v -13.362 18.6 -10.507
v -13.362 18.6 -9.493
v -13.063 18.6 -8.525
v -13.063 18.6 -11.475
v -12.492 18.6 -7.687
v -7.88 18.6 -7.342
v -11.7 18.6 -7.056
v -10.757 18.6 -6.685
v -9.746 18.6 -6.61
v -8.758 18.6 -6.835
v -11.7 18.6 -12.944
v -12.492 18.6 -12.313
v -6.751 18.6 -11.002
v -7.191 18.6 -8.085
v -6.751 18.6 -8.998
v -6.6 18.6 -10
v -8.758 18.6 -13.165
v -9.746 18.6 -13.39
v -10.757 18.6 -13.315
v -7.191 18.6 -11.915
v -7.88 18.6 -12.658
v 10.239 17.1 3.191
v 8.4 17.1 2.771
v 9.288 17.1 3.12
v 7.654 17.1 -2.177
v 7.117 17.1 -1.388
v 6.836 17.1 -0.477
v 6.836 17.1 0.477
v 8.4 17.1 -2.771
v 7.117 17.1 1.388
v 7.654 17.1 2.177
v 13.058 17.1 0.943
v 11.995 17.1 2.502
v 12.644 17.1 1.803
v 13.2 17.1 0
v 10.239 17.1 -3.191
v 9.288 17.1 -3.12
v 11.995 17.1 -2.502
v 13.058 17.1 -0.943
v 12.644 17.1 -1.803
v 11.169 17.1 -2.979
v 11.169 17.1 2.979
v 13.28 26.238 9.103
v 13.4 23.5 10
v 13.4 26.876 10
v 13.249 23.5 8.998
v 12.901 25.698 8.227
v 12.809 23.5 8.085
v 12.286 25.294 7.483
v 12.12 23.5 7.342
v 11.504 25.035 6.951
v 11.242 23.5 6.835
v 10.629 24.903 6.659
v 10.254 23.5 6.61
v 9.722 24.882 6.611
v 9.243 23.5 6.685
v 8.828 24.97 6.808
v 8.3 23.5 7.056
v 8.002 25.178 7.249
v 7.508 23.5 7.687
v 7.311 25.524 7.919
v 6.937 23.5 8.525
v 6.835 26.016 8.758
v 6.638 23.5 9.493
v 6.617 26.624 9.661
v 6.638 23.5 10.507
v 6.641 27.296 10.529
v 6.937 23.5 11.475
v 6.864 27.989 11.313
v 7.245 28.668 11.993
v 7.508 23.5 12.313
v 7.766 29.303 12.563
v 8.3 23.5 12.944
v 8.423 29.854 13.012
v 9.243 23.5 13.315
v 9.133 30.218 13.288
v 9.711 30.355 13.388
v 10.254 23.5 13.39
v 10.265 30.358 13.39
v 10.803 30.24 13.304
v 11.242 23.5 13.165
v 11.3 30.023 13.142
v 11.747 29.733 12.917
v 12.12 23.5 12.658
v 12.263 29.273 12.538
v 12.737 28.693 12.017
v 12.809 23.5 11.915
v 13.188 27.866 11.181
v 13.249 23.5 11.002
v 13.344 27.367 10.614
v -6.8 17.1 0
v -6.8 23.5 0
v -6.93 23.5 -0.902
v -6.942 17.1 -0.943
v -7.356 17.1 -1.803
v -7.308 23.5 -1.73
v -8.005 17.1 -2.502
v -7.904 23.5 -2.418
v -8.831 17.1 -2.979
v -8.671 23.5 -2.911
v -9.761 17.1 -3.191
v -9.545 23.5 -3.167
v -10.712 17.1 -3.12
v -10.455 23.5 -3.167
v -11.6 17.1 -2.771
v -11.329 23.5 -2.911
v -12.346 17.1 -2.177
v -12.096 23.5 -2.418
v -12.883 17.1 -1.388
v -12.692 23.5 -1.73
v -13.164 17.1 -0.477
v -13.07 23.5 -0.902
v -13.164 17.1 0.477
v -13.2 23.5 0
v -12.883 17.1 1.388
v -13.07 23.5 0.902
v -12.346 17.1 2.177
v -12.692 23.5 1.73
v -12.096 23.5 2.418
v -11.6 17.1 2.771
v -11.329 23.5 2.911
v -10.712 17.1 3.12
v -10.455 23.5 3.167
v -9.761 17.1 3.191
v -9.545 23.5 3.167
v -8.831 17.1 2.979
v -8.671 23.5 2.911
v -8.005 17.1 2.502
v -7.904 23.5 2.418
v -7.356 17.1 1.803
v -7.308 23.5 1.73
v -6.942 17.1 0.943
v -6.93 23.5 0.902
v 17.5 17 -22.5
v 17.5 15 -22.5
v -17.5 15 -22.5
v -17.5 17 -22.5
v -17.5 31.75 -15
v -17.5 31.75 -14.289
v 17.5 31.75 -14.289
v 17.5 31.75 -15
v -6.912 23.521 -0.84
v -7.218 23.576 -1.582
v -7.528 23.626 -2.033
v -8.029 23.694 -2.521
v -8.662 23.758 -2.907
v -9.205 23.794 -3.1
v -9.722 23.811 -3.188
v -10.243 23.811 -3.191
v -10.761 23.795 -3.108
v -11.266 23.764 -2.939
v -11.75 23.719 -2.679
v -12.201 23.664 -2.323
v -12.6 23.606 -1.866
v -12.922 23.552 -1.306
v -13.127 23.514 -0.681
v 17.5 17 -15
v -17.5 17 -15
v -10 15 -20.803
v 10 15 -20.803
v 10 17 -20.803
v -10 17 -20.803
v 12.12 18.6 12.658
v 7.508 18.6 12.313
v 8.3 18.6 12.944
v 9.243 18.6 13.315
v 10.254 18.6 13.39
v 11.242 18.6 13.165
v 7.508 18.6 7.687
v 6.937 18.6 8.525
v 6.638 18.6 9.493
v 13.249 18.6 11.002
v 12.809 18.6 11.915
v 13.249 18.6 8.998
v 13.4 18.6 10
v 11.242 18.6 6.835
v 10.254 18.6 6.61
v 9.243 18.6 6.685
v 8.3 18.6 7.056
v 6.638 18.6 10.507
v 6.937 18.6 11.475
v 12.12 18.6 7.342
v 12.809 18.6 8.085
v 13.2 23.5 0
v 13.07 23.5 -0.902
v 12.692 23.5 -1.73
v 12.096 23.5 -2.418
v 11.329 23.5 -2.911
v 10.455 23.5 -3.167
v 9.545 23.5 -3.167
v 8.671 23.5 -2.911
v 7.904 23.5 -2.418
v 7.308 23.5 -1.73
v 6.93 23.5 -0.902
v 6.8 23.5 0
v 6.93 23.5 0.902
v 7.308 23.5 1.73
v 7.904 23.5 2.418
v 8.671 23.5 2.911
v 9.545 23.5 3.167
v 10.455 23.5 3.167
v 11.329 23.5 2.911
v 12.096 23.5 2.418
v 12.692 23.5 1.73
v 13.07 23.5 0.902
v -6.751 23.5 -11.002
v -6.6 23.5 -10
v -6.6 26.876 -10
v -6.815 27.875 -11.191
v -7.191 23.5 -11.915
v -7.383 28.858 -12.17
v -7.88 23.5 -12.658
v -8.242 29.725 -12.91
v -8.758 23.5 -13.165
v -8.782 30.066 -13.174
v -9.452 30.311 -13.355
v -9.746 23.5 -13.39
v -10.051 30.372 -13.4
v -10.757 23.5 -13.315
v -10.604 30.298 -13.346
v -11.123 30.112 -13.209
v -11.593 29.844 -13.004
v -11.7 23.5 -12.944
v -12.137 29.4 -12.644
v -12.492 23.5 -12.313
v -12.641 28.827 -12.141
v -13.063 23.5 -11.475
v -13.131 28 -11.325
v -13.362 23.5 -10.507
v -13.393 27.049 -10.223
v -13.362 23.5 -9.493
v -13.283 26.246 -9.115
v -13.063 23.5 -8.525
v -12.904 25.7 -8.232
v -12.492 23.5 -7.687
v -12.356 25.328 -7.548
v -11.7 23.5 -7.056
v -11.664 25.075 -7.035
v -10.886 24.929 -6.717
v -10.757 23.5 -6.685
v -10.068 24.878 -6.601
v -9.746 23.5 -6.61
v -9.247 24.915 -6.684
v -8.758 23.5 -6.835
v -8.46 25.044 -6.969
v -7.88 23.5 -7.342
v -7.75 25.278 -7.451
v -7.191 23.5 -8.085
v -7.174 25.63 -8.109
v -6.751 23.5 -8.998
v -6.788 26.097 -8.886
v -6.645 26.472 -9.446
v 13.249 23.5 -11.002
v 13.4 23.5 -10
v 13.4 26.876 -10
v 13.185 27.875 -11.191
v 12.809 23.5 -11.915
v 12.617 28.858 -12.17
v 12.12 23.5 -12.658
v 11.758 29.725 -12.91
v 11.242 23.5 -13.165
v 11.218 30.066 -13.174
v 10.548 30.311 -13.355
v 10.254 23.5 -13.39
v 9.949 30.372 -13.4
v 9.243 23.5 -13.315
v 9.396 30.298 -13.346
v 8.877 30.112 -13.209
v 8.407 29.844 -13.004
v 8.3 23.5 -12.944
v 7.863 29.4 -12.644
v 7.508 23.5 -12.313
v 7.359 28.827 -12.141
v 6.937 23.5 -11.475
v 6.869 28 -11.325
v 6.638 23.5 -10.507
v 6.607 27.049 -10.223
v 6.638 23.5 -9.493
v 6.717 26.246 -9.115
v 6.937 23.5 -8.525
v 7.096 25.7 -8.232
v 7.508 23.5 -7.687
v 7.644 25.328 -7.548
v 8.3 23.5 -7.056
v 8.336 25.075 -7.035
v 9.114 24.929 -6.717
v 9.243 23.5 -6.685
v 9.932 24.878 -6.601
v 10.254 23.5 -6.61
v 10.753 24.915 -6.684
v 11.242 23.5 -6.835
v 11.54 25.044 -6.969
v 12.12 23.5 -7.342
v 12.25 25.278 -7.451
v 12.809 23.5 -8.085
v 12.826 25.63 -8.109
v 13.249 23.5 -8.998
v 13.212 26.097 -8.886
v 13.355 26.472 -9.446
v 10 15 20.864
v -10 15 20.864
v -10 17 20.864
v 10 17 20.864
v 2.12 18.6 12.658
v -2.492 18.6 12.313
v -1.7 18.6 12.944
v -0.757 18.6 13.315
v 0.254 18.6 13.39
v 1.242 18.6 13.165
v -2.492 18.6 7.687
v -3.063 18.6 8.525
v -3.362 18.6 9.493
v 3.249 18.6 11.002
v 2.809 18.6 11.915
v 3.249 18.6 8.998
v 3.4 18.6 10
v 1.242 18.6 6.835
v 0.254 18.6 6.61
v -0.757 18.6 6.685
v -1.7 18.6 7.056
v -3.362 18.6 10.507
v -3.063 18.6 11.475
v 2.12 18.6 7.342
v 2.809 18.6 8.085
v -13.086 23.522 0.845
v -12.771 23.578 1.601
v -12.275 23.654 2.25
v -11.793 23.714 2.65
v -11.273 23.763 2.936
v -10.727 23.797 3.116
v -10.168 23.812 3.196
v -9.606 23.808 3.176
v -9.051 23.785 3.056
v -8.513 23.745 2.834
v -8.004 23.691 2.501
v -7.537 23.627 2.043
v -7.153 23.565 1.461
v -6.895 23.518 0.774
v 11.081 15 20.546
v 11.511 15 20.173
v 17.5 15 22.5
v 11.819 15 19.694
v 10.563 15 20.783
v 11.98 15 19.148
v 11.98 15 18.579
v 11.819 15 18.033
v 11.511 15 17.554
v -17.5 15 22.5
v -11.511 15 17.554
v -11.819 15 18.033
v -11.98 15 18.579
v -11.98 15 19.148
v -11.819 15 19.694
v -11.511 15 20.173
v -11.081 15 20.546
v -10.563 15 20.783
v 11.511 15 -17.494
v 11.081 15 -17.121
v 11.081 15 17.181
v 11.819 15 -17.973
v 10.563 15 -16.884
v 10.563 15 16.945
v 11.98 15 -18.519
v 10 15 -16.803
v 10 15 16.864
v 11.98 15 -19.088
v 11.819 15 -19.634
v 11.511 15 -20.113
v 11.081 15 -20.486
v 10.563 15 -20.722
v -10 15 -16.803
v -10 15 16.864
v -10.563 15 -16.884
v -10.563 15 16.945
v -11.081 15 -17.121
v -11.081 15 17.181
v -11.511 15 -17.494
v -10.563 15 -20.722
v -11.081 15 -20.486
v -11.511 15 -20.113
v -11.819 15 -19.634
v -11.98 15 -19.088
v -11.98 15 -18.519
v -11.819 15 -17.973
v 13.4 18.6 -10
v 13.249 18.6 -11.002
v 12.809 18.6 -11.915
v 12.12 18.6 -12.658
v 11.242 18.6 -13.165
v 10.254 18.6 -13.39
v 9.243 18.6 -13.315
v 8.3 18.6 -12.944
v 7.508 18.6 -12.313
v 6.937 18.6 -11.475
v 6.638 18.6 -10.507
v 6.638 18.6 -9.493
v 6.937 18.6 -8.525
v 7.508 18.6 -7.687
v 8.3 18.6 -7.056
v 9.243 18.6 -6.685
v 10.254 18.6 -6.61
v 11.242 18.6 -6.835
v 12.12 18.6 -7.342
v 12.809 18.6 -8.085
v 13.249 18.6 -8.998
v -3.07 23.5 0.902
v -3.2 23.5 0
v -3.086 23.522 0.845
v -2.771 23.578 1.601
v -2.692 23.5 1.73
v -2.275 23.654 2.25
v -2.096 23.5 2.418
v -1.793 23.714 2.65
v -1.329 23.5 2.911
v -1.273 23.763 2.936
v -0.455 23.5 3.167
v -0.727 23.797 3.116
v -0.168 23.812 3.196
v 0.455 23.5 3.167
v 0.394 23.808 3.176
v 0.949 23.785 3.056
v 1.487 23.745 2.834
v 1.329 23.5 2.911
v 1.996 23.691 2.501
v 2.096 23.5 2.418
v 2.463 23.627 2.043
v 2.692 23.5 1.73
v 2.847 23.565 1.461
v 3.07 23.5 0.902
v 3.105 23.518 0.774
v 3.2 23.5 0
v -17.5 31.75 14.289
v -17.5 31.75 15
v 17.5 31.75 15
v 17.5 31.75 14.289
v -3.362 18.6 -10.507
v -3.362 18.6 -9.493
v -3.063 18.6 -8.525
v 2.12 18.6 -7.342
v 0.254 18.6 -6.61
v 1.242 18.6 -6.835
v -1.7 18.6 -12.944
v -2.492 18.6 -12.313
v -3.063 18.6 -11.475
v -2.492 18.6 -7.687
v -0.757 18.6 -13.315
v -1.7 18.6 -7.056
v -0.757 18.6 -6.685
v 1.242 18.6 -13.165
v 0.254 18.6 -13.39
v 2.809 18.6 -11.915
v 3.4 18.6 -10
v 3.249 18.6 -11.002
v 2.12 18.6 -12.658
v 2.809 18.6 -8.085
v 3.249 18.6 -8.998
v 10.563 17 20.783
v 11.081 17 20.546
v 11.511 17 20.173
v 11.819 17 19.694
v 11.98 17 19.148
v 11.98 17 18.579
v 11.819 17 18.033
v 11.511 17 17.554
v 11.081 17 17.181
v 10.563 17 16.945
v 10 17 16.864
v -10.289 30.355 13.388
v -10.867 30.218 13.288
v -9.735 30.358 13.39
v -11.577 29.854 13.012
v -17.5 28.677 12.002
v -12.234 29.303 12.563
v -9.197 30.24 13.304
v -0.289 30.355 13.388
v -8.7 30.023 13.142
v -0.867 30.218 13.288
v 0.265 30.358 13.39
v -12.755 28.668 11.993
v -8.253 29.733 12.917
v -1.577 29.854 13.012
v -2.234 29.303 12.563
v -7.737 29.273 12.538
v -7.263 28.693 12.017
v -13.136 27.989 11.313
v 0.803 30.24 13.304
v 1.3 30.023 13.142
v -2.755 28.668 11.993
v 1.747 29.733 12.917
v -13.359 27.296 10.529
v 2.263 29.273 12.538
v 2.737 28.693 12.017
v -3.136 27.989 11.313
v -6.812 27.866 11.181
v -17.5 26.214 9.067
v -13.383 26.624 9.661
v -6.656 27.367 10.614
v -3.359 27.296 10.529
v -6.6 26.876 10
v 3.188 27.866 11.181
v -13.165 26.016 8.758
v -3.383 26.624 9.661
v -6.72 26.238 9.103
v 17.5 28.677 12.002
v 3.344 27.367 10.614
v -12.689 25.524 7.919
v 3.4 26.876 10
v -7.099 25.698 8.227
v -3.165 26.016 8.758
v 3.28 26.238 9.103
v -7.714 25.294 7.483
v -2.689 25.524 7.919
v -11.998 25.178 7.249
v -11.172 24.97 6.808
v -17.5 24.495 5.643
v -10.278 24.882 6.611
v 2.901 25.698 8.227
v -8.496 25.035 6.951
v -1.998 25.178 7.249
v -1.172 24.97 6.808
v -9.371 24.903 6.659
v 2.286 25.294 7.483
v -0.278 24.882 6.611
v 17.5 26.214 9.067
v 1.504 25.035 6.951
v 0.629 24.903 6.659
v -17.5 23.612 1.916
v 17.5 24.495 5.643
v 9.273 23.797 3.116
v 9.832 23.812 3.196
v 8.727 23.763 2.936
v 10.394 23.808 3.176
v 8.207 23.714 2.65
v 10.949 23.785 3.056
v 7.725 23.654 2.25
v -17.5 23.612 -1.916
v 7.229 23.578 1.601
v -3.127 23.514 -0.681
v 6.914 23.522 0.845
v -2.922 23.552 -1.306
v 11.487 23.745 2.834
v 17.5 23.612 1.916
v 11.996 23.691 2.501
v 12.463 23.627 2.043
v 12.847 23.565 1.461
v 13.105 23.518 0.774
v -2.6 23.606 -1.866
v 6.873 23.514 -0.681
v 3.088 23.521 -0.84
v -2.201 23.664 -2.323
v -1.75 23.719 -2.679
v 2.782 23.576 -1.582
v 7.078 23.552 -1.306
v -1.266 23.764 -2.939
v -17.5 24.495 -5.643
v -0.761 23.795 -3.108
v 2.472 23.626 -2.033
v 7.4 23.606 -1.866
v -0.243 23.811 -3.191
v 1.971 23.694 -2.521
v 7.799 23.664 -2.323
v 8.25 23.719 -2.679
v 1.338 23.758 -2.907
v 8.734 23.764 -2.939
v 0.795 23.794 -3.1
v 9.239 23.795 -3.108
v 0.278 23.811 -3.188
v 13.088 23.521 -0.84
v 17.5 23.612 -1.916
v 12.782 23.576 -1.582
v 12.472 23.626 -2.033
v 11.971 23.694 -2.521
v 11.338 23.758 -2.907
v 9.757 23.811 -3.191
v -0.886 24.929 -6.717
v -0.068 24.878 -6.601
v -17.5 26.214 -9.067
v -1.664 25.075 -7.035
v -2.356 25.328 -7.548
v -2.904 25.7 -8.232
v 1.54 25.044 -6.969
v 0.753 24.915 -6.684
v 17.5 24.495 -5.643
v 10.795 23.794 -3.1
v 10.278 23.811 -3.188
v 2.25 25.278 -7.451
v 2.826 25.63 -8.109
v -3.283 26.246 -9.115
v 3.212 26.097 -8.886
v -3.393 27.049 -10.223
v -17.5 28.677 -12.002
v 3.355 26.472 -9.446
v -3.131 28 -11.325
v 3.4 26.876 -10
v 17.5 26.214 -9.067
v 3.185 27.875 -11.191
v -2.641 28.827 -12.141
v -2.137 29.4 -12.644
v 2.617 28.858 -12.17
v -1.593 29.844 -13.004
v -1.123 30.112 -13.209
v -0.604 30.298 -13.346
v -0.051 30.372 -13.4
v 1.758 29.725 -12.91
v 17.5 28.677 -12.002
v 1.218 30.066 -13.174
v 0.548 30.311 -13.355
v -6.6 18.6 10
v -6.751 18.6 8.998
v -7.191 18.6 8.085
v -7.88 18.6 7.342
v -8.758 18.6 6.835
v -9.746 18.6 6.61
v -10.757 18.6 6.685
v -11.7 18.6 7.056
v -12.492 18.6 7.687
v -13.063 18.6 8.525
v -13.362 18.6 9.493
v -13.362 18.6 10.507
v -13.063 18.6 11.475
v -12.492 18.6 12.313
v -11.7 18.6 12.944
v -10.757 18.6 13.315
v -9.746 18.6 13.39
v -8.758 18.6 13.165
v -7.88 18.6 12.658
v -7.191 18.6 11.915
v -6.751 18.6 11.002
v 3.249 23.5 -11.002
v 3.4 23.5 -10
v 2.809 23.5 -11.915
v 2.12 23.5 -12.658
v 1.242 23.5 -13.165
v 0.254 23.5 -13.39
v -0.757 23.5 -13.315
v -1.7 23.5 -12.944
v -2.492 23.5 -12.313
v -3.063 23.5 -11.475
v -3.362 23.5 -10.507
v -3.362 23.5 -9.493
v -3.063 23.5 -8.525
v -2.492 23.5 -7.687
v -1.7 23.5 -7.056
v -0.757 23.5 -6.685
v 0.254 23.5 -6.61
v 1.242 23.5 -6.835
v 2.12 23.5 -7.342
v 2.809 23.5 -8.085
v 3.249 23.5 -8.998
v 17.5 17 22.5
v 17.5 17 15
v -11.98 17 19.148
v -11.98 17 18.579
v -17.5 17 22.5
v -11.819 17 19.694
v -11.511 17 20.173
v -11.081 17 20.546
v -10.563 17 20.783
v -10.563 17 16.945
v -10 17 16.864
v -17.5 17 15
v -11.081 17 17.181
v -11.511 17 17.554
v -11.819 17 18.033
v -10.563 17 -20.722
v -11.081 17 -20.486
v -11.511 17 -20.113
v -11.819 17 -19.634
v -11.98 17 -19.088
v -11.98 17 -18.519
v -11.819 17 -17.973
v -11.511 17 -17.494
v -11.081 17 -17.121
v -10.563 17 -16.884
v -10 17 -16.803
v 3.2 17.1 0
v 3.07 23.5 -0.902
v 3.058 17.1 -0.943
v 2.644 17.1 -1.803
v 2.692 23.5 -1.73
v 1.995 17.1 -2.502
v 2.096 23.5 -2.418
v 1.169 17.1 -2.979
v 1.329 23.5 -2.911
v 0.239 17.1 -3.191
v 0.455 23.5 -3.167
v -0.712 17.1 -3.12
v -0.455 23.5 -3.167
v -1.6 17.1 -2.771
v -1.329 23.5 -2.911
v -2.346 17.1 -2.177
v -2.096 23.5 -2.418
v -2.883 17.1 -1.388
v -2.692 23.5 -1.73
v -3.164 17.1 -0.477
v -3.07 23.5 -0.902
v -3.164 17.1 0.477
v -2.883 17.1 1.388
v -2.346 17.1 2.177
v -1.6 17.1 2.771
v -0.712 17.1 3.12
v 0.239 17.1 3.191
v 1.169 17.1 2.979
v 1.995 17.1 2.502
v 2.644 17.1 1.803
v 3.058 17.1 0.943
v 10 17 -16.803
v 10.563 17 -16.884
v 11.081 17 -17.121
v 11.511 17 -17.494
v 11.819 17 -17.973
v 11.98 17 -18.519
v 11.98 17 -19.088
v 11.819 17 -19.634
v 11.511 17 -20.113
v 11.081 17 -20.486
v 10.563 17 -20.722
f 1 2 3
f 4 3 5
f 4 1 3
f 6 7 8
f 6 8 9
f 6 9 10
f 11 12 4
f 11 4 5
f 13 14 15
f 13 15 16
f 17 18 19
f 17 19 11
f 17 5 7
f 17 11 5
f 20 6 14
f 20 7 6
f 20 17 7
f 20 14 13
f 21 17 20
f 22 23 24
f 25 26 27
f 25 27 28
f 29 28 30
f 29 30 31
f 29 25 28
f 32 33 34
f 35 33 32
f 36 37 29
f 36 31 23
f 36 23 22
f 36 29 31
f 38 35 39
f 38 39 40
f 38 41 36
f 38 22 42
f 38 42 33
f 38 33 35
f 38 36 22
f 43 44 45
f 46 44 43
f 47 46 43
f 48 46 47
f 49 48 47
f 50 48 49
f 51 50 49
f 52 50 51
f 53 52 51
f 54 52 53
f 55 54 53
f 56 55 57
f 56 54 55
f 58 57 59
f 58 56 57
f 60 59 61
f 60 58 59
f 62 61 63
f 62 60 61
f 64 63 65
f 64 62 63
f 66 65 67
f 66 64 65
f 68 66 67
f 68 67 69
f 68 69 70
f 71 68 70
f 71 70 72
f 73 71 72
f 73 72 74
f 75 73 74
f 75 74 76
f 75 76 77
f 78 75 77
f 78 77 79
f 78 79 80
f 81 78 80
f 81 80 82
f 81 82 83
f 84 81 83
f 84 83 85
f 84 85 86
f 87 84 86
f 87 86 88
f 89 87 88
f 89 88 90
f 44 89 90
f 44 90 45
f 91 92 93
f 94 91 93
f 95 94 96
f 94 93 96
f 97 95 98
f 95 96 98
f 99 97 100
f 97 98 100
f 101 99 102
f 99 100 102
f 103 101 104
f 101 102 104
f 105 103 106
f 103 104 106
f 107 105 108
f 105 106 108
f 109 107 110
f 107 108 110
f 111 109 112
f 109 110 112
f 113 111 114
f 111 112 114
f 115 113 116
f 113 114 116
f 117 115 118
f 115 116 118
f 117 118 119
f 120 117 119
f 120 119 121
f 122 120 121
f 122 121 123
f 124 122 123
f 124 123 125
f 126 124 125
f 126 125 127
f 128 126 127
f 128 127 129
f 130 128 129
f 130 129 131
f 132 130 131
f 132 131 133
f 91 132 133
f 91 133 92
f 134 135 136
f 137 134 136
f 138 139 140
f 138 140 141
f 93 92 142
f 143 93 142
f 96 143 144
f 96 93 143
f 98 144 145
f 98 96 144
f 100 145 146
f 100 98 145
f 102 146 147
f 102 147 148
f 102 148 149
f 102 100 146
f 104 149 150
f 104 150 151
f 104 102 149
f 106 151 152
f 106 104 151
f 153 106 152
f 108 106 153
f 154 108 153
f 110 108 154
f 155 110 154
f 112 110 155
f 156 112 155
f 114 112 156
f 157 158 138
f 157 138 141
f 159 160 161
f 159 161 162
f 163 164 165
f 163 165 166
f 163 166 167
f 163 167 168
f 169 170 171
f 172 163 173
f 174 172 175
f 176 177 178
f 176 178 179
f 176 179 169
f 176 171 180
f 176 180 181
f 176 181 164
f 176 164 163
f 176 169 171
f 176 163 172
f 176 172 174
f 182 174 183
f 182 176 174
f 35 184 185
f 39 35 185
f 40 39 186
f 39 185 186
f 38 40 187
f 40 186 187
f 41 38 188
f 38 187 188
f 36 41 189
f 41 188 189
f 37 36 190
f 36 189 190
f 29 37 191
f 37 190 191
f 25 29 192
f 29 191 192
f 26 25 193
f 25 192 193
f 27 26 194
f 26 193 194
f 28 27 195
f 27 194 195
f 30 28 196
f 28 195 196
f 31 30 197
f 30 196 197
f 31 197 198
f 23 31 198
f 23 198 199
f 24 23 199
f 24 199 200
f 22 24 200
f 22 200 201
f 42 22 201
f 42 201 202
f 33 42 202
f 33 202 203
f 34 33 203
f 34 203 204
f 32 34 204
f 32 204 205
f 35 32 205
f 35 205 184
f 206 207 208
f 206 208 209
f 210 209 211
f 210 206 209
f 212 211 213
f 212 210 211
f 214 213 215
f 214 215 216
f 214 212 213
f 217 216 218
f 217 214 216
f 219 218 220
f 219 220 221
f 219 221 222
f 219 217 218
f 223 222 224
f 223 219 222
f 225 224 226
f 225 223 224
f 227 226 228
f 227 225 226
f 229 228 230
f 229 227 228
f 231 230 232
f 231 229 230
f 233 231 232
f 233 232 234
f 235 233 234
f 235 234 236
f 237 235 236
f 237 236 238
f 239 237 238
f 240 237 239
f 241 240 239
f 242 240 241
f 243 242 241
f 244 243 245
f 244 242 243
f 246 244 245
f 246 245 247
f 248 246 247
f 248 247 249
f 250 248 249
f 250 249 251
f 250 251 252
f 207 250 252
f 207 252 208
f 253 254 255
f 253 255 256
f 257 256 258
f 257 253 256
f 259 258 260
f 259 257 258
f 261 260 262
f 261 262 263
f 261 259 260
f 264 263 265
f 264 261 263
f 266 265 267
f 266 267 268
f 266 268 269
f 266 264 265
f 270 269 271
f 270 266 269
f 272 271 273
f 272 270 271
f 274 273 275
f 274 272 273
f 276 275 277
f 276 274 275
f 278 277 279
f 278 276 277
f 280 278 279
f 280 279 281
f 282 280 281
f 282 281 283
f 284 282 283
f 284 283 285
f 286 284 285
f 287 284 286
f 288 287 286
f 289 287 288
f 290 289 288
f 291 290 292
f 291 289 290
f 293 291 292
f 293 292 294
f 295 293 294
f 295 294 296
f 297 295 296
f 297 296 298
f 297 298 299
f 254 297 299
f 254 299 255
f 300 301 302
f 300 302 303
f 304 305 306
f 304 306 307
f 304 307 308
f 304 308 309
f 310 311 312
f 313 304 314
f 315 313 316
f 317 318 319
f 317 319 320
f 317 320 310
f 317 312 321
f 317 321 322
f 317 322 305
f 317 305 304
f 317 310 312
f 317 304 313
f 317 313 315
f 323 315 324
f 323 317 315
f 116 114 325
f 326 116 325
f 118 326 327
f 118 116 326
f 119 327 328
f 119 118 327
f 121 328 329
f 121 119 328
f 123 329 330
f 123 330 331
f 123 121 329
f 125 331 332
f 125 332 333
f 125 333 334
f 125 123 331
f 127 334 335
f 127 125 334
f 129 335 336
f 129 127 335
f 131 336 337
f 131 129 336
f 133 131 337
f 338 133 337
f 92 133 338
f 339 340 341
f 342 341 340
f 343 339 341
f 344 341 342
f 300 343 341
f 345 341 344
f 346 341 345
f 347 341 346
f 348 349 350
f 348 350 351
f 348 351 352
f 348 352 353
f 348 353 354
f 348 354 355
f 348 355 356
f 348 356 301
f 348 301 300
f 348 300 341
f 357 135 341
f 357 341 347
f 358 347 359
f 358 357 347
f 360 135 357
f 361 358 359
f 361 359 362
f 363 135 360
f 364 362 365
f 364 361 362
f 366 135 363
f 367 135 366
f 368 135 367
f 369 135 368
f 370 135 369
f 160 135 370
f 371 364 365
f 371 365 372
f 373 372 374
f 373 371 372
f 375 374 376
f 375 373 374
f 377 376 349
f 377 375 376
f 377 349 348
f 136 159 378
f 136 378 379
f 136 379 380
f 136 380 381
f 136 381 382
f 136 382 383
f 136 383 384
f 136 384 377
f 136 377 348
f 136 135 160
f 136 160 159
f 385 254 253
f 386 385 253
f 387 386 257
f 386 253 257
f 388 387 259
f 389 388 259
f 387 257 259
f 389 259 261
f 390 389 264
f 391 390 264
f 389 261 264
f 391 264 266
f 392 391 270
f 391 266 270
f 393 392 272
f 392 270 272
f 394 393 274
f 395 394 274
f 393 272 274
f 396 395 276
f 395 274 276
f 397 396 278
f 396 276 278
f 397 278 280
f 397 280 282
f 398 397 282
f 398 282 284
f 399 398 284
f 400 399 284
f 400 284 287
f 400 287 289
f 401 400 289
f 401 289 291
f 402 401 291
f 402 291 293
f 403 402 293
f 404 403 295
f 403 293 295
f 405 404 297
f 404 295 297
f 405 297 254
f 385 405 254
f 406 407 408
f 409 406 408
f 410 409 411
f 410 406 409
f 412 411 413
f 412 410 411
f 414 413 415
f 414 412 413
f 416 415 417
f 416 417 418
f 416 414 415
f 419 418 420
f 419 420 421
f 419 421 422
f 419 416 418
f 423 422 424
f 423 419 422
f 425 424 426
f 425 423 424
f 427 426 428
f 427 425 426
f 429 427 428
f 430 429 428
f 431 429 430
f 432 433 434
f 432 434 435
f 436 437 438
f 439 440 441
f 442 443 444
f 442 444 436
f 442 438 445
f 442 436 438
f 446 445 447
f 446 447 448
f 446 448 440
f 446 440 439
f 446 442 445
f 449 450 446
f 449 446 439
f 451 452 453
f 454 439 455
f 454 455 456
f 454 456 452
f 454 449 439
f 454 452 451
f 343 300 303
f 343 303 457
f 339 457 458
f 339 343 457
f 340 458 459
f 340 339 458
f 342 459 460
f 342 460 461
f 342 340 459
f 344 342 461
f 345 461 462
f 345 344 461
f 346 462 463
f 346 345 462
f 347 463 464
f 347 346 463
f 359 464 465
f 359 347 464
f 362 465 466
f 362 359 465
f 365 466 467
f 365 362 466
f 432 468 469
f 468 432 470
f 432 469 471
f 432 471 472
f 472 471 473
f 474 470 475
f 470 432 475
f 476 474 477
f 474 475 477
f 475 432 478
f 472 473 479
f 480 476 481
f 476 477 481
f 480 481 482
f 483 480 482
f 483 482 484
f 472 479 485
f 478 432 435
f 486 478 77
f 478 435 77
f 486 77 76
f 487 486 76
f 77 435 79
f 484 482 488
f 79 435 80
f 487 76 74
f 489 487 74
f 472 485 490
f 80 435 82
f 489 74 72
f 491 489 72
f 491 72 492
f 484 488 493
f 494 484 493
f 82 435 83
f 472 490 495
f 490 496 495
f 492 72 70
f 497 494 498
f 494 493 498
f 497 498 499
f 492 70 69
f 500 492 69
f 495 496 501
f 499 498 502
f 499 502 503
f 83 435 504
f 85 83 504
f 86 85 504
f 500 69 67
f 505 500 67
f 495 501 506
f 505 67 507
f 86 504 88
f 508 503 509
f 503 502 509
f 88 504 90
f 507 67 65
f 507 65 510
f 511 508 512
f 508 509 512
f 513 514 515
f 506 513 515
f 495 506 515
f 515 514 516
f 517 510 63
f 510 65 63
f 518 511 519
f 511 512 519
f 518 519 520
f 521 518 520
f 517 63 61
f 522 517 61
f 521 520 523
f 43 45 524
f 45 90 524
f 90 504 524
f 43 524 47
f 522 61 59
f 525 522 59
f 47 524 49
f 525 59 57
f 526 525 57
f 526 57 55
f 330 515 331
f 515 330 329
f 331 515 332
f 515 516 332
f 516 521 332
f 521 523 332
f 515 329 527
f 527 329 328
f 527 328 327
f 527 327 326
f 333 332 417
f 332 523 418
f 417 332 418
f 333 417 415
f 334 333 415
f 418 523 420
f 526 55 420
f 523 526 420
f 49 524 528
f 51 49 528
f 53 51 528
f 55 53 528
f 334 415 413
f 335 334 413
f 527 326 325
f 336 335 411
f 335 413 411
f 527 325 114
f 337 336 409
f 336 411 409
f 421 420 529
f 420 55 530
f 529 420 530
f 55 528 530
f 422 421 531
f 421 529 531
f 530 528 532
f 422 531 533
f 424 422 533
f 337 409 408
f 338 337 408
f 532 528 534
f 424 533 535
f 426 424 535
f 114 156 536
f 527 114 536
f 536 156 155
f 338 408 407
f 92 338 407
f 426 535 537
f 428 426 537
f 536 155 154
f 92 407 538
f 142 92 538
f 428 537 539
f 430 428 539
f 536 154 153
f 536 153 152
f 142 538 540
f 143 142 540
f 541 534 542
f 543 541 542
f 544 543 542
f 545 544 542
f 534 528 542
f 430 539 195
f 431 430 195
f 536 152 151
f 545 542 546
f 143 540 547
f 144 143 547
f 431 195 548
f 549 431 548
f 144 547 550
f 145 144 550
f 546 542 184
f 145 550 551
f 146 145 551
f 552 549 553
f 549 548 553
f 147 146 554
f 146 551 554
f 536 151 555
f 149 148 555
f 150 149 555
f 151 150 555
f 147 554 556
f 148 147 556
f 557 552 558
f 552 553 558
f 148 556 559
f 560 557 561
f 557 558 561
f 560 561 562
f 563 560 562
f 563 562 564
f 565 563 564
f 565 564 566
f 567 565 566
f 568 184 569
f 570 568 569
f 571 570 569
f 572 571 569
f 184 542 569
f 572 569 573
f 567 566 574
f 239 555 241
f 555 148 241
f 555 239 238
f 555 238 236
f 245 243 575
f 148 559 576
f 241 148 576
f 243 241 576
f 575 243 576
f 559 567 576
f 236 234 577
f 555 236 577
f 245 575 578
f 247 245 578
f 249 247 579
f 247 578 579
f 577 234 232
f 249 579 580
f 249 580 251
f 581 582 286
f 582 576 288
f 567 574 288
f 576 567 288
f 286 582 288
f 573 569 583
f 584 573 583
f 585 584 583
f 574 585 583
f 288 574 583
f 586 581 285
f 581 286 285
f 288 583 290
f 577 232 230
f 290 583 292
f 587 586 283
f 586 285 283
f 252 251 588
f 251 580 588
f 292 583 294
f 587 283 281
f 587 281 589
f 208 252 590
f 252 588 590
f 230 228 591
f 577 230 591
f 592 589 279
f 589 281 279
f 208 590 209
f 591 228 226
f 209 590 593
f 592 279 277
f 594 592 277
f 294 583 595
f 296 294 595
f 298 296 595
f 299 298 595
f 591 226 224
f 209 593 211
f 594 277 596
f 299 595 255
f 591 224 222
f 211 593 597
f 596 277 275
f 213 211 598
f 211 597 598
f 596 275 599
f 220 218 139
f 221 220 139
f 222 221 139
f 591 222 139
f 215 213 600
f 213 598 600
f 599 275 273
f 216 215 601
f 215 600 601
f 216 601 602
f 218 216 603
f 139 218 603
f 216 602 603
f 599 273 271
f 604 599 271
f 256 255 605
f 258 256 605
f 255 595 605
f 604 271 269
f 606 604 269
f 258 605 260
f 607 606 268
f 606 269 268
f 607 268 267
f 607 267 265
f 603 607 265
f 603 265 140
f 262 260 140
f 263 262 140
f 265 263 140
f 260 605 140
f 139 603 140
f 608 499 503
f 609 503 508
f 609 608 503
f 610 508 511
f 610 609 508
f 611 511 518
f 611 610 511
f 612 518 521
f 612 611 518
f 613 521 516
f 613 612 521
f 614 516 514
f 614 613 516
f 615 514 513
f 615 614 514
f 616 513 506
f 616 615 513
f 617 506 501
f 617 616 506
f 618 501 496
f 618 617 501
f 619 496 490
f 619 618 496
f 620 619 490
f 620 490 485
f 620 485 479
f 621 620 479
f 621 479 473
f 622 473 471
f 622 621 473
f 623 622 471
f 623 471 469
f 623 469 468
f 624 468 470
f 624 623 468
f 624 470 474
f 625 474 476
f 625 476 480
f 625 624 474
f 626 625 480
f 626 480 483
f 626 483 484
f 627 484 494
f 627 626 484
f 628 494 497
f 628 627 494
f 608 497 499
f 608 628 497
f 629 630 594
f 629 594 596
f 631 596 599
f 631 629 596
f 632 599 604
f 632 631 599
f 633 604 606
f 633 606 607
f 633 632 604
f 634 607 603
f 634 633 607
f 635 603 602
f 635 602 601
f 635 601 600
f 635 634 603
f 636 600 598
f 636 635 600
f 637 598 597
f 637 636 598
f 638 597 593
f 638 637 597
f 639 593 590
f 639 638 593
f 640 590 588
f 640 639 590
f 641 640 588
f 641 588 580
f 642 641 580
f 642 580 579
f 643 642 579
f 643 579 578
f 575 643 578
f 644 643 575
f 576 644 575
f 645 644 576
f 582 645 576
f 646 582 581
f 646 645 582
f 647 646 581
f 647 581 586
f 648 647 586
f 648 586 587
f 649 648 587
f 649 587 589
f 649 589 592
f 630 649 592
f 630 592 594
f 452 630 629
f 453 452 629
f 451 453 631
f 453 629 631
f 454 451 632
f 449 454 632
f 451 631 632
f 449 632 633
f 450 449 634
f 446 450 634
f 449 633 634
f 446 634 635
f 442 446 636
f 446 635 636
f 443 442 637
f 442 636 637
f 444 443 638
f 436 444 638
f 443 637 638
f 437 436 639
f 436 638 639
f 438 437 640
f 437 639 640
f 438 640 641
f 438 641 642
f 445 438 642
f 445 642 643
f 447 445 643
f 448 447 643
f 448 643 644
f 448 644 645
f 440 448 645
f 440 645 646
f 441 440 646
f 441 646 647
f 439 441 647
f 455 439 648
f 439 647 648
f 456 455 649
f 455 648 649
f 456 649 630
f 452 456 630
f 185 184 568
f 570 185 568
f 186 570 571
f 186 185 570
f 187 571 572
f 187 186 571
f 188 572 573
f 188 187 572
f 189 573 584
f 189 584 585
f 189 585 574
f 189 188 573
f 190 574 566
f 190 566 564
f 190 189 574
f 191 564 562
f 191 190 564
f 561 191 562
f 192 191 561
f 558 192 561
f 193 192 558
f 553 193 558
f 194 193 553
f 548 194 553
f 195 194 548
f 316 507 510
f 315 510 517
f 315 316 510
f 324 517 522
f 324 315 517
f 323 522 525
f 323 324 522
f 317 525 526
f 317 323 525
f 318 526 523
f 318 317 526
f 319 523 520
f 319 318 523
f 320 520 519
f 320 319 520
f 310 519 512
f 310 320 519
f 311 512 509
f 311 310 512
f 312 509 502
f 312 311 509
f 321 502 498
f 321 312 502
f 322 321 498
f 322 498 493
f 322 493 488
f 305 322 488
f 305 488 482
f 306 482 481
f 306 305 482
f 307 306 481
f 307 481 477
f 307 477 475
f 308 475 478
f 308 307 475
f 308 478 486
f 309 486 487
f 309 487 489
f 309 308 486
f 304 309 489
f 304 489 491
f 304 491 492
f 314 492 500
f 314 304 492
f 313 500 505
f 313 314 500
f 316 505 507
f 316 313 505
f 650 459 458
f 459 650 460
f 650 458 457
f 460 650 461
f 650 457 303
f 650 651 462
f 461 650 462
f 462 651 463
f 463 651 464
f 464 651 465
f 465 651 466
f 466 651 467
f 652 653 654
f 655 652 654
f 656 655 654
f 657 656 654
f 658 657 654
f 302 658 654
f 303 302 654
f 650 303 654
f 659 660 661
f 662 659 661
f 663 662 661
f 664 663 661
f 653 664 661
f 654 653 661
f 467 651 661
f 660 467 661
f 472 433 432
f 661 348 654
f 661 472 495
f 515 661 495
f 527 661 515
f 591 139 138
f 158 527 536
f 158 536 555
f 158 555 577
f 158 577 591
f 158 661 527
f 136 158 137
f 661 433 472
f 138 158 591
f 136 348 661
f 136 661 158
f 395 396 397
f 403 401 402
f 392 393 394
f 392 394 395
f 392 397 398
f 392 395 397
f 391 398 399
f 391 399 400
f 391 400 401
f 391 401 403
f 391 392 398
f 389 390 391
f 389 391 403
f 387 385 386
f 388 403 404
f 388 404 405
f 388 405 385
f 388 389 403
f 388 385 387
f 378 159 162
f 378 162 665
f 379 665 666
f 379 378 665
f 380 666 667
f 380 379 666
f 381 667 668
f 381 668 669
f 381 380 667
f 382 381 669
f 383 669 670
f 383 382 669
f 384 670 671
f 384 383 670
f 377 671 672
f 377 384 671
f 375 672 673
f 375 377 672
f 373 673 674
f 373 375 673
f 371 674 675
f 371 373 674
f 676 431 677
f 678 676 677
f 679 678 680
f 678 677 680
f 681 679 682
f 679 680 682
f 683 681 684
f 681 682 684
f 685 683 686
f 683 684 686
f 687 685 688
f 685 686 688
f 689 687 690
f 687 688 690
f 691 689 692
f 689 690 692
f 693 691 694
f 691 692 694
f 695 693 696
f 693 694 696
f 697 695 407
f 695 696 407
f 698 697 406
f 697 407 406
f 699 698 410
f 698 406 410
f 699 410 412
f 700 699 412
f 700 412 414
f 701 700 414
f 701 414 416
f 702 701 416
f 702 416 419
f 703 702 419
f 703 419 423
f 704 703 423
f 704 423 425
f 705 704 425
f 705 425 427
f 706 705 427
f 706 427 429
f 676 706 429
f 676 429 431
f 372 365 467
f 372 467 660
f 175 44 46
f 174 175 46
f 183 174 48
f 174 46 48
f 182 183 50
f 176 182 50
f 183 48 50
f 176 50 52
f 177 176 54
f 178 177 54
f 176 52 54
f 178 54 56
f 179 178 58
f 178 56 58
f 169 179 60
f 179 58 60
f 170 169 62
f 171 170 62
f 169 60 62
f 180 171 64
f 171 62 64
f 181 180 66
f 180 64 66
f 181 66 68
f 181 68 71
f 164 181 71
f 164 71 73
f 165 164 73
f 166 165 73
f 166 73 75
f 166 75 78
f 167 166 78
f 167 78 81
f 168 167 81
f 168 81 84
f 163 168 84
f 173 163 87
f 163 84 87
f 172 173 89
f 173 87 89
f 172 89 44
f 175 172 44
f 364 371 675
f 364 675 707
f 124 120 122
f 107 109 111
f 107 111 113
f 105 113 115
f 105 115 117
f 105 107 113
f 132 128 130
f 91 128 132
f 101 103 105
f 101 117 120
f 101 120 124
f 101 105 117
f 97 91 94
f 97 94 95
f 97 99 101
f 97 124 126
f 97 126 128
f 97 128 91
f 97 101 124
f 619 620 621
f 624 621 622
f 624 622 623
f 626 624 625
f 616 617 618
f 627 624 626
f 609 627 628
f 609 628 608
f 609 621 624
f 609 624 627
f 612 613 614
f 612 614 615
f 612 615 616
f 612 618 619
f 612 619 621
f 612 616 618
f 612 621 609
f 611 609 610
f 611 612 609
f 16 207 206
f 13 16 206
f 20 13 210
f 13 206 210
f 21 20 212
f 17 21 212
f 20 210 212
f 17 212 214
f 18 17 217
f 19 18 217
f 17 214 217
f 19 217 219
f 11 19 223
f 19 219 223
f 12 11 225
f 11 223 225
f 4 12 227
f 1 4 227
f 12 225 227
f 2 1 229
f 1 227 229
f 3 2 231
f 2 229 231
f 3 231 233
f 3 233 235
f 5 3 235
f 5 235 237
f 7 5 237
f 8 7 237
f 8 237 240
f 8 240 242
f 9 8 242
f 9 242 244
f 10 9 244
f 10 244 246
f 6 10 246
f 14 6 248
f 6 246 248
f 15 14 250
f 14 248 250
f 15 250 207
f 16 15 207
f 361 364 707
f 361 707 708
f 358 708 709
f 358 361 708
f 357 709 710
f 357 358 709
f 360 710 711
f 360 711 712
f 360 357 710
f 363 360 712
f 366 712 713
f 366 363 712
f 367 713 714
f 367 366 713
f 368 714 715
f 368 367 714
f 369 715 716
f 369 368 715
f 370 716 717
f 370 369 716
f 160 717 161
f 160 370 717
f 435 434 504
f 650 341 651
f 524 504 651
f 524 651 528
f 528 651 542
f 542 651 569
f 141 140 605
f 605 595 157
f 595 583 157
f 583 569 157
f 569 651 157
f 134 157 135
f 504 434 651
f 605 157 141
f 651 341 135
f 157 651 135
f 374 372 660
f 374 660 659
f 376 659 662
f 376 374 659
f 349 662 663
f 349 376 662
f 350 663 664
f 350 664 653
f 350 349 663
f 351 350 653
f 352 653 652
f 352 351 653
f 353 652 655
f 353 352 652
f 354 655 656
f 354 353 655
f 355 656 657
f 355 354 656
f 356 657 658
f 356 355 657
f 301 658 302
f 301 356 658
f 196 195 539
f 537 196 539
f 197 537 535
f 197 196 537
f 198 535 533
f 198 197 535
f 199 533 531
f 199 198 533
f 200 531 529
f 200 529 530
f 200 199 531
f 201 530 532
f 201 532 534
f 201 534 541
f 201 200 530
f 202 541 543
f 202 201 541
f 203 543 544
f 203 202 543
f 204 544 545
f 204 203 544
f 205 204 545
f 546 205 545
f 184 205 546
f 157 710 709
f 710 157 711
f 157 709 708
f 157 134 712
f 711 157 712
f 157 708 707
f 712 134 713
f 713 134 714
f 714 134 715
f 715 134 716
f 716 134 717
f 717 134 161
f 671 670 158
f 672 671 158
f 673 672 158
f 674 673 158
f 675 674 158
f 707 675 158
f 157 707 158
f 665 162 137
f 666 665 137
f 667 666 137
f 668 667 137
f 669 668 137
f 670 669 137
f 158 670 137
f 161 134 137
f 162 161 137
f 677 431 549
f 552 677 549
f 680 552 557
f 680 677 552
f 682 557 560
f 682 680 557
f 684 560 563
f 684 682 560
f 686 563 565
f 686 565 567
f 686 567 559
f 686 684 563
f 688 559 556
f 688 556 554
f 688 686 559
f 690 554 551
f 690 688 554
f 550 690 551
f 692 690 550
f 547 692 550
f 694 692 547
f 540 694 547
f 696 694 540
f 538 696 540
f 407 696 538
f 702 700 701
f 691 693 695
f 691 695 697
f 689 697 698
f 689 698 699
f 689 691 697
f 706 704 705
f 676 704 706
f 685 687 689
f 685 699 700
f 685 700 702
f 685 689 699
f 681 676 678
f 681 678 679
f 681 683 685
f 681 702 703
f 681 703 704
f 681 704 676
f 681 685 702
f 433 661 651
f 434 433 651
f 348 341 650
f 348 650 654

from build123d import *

# Parameters (mm, degrees)
SKETCH8_W                       = 35
SKETCH8_H                       = 30
BOSS_EXTRUDE7_DEPTH             = 80
SKETCH10_R                      = 16.5
CUT_EXTRUDE3_DEPTH              = 18.5
CUT_EXTRUDE3_DEPTH_BACK         = 18.5
SKETCH11_W                      = 38.336381606
SKETCH11_H                      = 16.50007926
CUT_EXTRUDE4_DEPTH              = 18.5
CUT_EXTRUDE4_DEPTH_BACK         = 18.5
SKETCH12_W                      = 33.824881692
SKETCH12_H                      = 15
CUT_EXTRUDE5_DEPTH              = 18.5
CUT_EXTRUDE5_DEPTH_BACK         = 18.5
SKETCH13_W                      = 45.541829225
SKETCH13_H                      = 41.48776408
CUT_EXTRUDE6_DEPTH              = 18.5
CUT_EXTRUDE6_DEPTH_BACK         = 18.5
SKETCH15_W                      = 35
SKETCH15_H                      = 7.5
BOSS_EXTRUDE9_DEPTH             = 2
CUT_EXTRUDE7_DEPTH              = 2
SKETCH18_R                      = 3.2
CUT_EXTRUDE10_DEPTH             = 9.24996037
CUT_EXTRUDE10_DEPTH_BACK        = 6.4
CUT_EXTRUDE11_REACH             = 10.25
SKETCH19_R                      = 3.4
CUT_EXTRUDE11_DIRECTION_2_DEPTH = 4.9


with BuildPart() as part:
    # Sketch8 → Boss-Extrude7 (new body)
    with BuildSketch(Plane(origin=(0, 0, 0), x_dir=(1, 0, 0), z_dir=(0, 1, 0))):
        Rectangle(SKETCH8_W, SKETCH8_H)
    extrude(amount=BOSS_EXTRUDE7_DEPTH)

    # Sketch10 → Cut-Extrude3 (cut, two sides)
    with BuildSketch(Plane(origin=(0, 0, 0), x_dir=(0, 0, -1), z_dir=(1, 0, 0))) as cut_extrude3_sk:
        with Locations((0, 40)):
            Circle(SKETCH10_R)
    extrude(amount=CUT_EXTRUDE3_DEPTH, mode=Mode.SUBTRACT)
    extrude(cut_extrude3_sk.sketch, amount=-CUT_EXTRUDE3_DEPTH_BACK, mode=Mode.SUBTRACT)

    # Sketch11 → Cut-Extrude4 (cut, two sides)
    with BuildSketch(Plane(origin=(0, 0, 0), x_dir=(0, 0, -1), z_dir=(1, 0, 0))) as cut_extrude4_sk:
        with Locations((0, 40)):
            Rectangle(SKETCH11_W, SKETCH11_H)
    extrude(amount=CUT_EXTRUDE4_DEPTH, mode=Mode.SUBTRACT)
    extrude(cut_extrude4_sk.sketch, amount=-CUT_EXTRUDE4_DEPTH_BACK, mode=Mode.SUBTRACT)

    # Sketch12 → Cut-Extrude5 (cut, two sides)
    with BuildSketch(Plane(origin=(0, 0, 0), x_dir=(0, 0, -1), z_dir=(1, 0, 0))) as cut_extrude5_sk:
        with Locations((0.439040256, 7.5)):
            Rectangle(SKETCH12_W, SKETCH12_H)
    extrude(amount=CUT_EXTRUDE5_DEPTH, mode=Mode.SUBTRACT)
    extrude(cut_extrude5_sk.sketch, amount=-CUT_EXTRUDE5_DEPTH_BACK, mode=Mode.SUBTRACT)

    # Sketch13 → Cut-Extrude6 (cut, two sides)
    with BuildSketch(Plane(origin=(0, 0, 0), x_dir=(0, 0, -1), z_dir=(1, 0, 0))) as cut_extrude6_sk:
        with Locations((-6.569234617, 60.808180877)):
            Rectangle(SKETCH13_W, SKETCH13_H)
    extrude(amount=CUT_EXTRUDE6_DEPTH, mode=Mode.SUBTRACT)
    extrude(cut_extrude6_sk.sketch, amount=-CUT_EXTRUDE6_DEPTH_BACK, mode=Mode.SUBTRACT)

    # Sketch15 → Boss-Extrude9 (add)
    with BuildSketch(Plane(origin=(0, 15, 0), x_dir=(-1, 0, 0), z_dir=(0, -1, 0))):
        with Locations((0, -18.75)):
            Rectangle(SKETCH15_W, SKETCH15_H)
        with Locations((0, 18.75)):
            Rectangle(SKETCH15_W, SKETCH15_H)
    extrude(amount=-BOSS_EXTRUDE9_DEPTH)

    # Sketch16 → Cut-Extrude7 (cut)
    with BuildSketch(Plane(origin=(0, 15, 0), x_dir=(-1, 0, 0), z_dir=(0, -1, 0))):
        with BuildLine():
            Line((10, -20.863517543), (-10, -20.863517543))
            ThreePointArc((-10, -20.863517543), (-12, -18.863517543), (-10, -16.863517543))
            Line((-10, -16.863517543), (10, -16.863517543))
            ThreePointArc((10, -16.863517543), (12, -18.863517543), (10, -20.863517543))
        make_face()
        with BuildLine():
            Line((10, 16.803450623), (-10, 16.803450623))
            ThreePointArc((-10, 16.803450623), (-12, 18.803450623), (-10, 20.803450623))
            Line((-10, 20.803450623), (10, 20.803450623))
            ThreePointArc((10, 20.803450623), (12, 18.803450623), (10, 16.803450623))
        make_face()
    extrude(amount=-CUT_EXTRUDE7_DEPTH, mode=Mode.SUBTRACT)

    # Sketch18 → Cut-Extrude10 (cut, two sides)
    with BuildSketch(Plane(origin=(0, 23.5, 0), x_dir=(1, 0, 0), z_dir=(0, 1, 0))) as cut_extrude10_sk:
        Circle(SKETCH18_R)
        with Locations((10, 0)):
            Circle(SKETCH18_R)
        with Locations((-10, 0)):
            Circle(SKETCH18_R)
    extrude(amount=CUT_EXTRUDE10_DEPTH, mode=Mode.SUBTRACT)
    extrude(cut_extrude10_sk.sketch, amount=-CUT_EXTRUDE10_DEPTH_BACK, mode=Mode.SUBTRACT)

    # Sketch19 → Cut-Extrude11 (cut, up to next)
    with BuildSketch(Plane(origin=(0, 23.5, 0), x_dir=(1, 0, 0), z_dir=(0, 1, 0)), mode=Mode.PRIVATE) as cut_extrude11_sk1:
        with Locations((-10, -10)):
            Circle(SKETCH19_R)
    cut_extrude11_tool1 = extrude(cut_extrude11_sk1.sketch, amount=CUT_EXTRUDE11_REACH, mode=Mode.PRIVATE) & part.part
    add(cut_extrude11_tool1.solids().sort_by_distance((-10, 23.5, 10))[0], mode=Mode.SUBTRACT)
    # Sketch19 → Cut-Extrude11 (cut, up to next)
    with BuildSketch(Plane(origin=(0, 23.5, 0), x_dir=(1, 0, 0), z_dir=(0, 1, 0)), mode=Mode.PRIVATE) as cut_extrude11_sk2:
        with Locations((0, -10)):
            Circle(SKETCH19_R)
    cut_extrude11_tool2 = extrude(cut_extrude11_sk2.sketch, amount=CUT_EXTRUDE11_REACH, mode=Mode.PRIVATE) & part.part
    add(cut_extrude11_tool2.solids().sort_by_distance((0, 23.5, 10))[0], mode=Mode.SUBTRACT)
    # Sketch19 → Cut-Extrude11 (cut, up to next)
    with BuildSketch(Plane(origin=(0, 23.5, 0), x_dir=(1, 0, 0), z_dir=(0, 1, 0)), mode=Mode.PRIVATE) as cut_extrude11_sk3:
        with Locations((10, -10)):
            Circle(SKETCH19_R)
    cut_extrude11_tool3 = extrude(cut_extrude11_sk3.sketch, amount=CUT_EXTRUDE11_REACH, mode=Mode.PRIVATE) & part.part
    add(cut_extrude11_tool3.solids().sort_by_distance((10, 23.5, 10))[0], mode=Mode.SUBTRACT)
    # Sketch19 → Cut-Extrude11 (cut, up to next)
    with BuildSketch(Plane(origin=(0, 23.5, 0), x_dir=(1, 0, 0), z_dir=(0, 1, 0)), mode=Mode.PRIVATE) as cut_extrude11_sk4:
        with Locations((-10, 10)):
            Circle(SKETCH19_R)
    cut_extrude11_tool4 = extrude(cut_extrude11_sk4.sketch, amount=CUT_EXTRUDE11_REACH, mode=Mode.PRIVATE) & part.part
    add(cut_extrude11_tool4.solids().sort_by_distance((-10, 23.5, -10))[0], mode=Mode.SUBTRACT)
    # Sketch19 → Cut-Extrude11 (cut, up to next)
    with BuildSketch(Plane(origin=(0, 23.5, 0), x_dir=(1, 0, 0), z_dir=(0, 1, 0)), mode=Mode.PRIVATE) as cut_extrude11_sk5:
        with Locations((0, 10)):
            Circle(SKETCH19_R)
    cut_extrude11_tool5 = extrude(cut_extrude11_sk5.sketch, amount=CUT_EXTRUDE11_REACH, mode=Mode.PRIVATE) & part.part
    add(cut_extrude11_tool5.solids().sort_by_distance((0, 23.5, -10))[0], mode=Mode.SUBTRACT)
    # Sketch19 → Cut-Extrude11 (cut, up to next)
    with BuildSketch(Plane(origin=(0, 23.5, 0), x_dir=(1, 0, 0), z_dir=(0, 1, 0)), mode=Mode.PRIVATE) as cut_extrude11_sk6:
        with Locations((10, 10)):
            Circle(SKETCH19_R)
    cut_extrude11_tool6 = extrude(cut_extrude11_sk6.sketch, amount=CUT_EXTRUDE11_REACH, mode=Mode.PRIVATE) & part.part
    add(cut_extrude11_tool6.solids().sort_by_distance((10, 23.5, -10))[0], mode=Mode.SUBTRACT)

    # Sketch19 → Cut-Extrude11 direction 2 (cut)
    with BuildSketch(Plane(origin=(0, 23.5, 0), x_dir=(1, 0, 0), z_dir=(0, 1, 0))):
        with Locations((-10, -10)):
            Circle(SKETCH19_R)
        with Locations((0, -10)):
            Circle(SKETCH19_R)
        with Locations((10, -10)):
            Circle(SKETCH19_R)
        with Locations((-10, 10)):
            Circle(SKETCH19_R)
        with Locations((0, 10)):
            Circle(SKETCH19_R)
        with Locations((10, 10)):
            Circle(SKETCH19_R)
    extrude(amount=-CUT_EXTRUDE11_DIRECTION_2_DEPTH, mode=Mode.SUBTRACT)


solid = part.part
